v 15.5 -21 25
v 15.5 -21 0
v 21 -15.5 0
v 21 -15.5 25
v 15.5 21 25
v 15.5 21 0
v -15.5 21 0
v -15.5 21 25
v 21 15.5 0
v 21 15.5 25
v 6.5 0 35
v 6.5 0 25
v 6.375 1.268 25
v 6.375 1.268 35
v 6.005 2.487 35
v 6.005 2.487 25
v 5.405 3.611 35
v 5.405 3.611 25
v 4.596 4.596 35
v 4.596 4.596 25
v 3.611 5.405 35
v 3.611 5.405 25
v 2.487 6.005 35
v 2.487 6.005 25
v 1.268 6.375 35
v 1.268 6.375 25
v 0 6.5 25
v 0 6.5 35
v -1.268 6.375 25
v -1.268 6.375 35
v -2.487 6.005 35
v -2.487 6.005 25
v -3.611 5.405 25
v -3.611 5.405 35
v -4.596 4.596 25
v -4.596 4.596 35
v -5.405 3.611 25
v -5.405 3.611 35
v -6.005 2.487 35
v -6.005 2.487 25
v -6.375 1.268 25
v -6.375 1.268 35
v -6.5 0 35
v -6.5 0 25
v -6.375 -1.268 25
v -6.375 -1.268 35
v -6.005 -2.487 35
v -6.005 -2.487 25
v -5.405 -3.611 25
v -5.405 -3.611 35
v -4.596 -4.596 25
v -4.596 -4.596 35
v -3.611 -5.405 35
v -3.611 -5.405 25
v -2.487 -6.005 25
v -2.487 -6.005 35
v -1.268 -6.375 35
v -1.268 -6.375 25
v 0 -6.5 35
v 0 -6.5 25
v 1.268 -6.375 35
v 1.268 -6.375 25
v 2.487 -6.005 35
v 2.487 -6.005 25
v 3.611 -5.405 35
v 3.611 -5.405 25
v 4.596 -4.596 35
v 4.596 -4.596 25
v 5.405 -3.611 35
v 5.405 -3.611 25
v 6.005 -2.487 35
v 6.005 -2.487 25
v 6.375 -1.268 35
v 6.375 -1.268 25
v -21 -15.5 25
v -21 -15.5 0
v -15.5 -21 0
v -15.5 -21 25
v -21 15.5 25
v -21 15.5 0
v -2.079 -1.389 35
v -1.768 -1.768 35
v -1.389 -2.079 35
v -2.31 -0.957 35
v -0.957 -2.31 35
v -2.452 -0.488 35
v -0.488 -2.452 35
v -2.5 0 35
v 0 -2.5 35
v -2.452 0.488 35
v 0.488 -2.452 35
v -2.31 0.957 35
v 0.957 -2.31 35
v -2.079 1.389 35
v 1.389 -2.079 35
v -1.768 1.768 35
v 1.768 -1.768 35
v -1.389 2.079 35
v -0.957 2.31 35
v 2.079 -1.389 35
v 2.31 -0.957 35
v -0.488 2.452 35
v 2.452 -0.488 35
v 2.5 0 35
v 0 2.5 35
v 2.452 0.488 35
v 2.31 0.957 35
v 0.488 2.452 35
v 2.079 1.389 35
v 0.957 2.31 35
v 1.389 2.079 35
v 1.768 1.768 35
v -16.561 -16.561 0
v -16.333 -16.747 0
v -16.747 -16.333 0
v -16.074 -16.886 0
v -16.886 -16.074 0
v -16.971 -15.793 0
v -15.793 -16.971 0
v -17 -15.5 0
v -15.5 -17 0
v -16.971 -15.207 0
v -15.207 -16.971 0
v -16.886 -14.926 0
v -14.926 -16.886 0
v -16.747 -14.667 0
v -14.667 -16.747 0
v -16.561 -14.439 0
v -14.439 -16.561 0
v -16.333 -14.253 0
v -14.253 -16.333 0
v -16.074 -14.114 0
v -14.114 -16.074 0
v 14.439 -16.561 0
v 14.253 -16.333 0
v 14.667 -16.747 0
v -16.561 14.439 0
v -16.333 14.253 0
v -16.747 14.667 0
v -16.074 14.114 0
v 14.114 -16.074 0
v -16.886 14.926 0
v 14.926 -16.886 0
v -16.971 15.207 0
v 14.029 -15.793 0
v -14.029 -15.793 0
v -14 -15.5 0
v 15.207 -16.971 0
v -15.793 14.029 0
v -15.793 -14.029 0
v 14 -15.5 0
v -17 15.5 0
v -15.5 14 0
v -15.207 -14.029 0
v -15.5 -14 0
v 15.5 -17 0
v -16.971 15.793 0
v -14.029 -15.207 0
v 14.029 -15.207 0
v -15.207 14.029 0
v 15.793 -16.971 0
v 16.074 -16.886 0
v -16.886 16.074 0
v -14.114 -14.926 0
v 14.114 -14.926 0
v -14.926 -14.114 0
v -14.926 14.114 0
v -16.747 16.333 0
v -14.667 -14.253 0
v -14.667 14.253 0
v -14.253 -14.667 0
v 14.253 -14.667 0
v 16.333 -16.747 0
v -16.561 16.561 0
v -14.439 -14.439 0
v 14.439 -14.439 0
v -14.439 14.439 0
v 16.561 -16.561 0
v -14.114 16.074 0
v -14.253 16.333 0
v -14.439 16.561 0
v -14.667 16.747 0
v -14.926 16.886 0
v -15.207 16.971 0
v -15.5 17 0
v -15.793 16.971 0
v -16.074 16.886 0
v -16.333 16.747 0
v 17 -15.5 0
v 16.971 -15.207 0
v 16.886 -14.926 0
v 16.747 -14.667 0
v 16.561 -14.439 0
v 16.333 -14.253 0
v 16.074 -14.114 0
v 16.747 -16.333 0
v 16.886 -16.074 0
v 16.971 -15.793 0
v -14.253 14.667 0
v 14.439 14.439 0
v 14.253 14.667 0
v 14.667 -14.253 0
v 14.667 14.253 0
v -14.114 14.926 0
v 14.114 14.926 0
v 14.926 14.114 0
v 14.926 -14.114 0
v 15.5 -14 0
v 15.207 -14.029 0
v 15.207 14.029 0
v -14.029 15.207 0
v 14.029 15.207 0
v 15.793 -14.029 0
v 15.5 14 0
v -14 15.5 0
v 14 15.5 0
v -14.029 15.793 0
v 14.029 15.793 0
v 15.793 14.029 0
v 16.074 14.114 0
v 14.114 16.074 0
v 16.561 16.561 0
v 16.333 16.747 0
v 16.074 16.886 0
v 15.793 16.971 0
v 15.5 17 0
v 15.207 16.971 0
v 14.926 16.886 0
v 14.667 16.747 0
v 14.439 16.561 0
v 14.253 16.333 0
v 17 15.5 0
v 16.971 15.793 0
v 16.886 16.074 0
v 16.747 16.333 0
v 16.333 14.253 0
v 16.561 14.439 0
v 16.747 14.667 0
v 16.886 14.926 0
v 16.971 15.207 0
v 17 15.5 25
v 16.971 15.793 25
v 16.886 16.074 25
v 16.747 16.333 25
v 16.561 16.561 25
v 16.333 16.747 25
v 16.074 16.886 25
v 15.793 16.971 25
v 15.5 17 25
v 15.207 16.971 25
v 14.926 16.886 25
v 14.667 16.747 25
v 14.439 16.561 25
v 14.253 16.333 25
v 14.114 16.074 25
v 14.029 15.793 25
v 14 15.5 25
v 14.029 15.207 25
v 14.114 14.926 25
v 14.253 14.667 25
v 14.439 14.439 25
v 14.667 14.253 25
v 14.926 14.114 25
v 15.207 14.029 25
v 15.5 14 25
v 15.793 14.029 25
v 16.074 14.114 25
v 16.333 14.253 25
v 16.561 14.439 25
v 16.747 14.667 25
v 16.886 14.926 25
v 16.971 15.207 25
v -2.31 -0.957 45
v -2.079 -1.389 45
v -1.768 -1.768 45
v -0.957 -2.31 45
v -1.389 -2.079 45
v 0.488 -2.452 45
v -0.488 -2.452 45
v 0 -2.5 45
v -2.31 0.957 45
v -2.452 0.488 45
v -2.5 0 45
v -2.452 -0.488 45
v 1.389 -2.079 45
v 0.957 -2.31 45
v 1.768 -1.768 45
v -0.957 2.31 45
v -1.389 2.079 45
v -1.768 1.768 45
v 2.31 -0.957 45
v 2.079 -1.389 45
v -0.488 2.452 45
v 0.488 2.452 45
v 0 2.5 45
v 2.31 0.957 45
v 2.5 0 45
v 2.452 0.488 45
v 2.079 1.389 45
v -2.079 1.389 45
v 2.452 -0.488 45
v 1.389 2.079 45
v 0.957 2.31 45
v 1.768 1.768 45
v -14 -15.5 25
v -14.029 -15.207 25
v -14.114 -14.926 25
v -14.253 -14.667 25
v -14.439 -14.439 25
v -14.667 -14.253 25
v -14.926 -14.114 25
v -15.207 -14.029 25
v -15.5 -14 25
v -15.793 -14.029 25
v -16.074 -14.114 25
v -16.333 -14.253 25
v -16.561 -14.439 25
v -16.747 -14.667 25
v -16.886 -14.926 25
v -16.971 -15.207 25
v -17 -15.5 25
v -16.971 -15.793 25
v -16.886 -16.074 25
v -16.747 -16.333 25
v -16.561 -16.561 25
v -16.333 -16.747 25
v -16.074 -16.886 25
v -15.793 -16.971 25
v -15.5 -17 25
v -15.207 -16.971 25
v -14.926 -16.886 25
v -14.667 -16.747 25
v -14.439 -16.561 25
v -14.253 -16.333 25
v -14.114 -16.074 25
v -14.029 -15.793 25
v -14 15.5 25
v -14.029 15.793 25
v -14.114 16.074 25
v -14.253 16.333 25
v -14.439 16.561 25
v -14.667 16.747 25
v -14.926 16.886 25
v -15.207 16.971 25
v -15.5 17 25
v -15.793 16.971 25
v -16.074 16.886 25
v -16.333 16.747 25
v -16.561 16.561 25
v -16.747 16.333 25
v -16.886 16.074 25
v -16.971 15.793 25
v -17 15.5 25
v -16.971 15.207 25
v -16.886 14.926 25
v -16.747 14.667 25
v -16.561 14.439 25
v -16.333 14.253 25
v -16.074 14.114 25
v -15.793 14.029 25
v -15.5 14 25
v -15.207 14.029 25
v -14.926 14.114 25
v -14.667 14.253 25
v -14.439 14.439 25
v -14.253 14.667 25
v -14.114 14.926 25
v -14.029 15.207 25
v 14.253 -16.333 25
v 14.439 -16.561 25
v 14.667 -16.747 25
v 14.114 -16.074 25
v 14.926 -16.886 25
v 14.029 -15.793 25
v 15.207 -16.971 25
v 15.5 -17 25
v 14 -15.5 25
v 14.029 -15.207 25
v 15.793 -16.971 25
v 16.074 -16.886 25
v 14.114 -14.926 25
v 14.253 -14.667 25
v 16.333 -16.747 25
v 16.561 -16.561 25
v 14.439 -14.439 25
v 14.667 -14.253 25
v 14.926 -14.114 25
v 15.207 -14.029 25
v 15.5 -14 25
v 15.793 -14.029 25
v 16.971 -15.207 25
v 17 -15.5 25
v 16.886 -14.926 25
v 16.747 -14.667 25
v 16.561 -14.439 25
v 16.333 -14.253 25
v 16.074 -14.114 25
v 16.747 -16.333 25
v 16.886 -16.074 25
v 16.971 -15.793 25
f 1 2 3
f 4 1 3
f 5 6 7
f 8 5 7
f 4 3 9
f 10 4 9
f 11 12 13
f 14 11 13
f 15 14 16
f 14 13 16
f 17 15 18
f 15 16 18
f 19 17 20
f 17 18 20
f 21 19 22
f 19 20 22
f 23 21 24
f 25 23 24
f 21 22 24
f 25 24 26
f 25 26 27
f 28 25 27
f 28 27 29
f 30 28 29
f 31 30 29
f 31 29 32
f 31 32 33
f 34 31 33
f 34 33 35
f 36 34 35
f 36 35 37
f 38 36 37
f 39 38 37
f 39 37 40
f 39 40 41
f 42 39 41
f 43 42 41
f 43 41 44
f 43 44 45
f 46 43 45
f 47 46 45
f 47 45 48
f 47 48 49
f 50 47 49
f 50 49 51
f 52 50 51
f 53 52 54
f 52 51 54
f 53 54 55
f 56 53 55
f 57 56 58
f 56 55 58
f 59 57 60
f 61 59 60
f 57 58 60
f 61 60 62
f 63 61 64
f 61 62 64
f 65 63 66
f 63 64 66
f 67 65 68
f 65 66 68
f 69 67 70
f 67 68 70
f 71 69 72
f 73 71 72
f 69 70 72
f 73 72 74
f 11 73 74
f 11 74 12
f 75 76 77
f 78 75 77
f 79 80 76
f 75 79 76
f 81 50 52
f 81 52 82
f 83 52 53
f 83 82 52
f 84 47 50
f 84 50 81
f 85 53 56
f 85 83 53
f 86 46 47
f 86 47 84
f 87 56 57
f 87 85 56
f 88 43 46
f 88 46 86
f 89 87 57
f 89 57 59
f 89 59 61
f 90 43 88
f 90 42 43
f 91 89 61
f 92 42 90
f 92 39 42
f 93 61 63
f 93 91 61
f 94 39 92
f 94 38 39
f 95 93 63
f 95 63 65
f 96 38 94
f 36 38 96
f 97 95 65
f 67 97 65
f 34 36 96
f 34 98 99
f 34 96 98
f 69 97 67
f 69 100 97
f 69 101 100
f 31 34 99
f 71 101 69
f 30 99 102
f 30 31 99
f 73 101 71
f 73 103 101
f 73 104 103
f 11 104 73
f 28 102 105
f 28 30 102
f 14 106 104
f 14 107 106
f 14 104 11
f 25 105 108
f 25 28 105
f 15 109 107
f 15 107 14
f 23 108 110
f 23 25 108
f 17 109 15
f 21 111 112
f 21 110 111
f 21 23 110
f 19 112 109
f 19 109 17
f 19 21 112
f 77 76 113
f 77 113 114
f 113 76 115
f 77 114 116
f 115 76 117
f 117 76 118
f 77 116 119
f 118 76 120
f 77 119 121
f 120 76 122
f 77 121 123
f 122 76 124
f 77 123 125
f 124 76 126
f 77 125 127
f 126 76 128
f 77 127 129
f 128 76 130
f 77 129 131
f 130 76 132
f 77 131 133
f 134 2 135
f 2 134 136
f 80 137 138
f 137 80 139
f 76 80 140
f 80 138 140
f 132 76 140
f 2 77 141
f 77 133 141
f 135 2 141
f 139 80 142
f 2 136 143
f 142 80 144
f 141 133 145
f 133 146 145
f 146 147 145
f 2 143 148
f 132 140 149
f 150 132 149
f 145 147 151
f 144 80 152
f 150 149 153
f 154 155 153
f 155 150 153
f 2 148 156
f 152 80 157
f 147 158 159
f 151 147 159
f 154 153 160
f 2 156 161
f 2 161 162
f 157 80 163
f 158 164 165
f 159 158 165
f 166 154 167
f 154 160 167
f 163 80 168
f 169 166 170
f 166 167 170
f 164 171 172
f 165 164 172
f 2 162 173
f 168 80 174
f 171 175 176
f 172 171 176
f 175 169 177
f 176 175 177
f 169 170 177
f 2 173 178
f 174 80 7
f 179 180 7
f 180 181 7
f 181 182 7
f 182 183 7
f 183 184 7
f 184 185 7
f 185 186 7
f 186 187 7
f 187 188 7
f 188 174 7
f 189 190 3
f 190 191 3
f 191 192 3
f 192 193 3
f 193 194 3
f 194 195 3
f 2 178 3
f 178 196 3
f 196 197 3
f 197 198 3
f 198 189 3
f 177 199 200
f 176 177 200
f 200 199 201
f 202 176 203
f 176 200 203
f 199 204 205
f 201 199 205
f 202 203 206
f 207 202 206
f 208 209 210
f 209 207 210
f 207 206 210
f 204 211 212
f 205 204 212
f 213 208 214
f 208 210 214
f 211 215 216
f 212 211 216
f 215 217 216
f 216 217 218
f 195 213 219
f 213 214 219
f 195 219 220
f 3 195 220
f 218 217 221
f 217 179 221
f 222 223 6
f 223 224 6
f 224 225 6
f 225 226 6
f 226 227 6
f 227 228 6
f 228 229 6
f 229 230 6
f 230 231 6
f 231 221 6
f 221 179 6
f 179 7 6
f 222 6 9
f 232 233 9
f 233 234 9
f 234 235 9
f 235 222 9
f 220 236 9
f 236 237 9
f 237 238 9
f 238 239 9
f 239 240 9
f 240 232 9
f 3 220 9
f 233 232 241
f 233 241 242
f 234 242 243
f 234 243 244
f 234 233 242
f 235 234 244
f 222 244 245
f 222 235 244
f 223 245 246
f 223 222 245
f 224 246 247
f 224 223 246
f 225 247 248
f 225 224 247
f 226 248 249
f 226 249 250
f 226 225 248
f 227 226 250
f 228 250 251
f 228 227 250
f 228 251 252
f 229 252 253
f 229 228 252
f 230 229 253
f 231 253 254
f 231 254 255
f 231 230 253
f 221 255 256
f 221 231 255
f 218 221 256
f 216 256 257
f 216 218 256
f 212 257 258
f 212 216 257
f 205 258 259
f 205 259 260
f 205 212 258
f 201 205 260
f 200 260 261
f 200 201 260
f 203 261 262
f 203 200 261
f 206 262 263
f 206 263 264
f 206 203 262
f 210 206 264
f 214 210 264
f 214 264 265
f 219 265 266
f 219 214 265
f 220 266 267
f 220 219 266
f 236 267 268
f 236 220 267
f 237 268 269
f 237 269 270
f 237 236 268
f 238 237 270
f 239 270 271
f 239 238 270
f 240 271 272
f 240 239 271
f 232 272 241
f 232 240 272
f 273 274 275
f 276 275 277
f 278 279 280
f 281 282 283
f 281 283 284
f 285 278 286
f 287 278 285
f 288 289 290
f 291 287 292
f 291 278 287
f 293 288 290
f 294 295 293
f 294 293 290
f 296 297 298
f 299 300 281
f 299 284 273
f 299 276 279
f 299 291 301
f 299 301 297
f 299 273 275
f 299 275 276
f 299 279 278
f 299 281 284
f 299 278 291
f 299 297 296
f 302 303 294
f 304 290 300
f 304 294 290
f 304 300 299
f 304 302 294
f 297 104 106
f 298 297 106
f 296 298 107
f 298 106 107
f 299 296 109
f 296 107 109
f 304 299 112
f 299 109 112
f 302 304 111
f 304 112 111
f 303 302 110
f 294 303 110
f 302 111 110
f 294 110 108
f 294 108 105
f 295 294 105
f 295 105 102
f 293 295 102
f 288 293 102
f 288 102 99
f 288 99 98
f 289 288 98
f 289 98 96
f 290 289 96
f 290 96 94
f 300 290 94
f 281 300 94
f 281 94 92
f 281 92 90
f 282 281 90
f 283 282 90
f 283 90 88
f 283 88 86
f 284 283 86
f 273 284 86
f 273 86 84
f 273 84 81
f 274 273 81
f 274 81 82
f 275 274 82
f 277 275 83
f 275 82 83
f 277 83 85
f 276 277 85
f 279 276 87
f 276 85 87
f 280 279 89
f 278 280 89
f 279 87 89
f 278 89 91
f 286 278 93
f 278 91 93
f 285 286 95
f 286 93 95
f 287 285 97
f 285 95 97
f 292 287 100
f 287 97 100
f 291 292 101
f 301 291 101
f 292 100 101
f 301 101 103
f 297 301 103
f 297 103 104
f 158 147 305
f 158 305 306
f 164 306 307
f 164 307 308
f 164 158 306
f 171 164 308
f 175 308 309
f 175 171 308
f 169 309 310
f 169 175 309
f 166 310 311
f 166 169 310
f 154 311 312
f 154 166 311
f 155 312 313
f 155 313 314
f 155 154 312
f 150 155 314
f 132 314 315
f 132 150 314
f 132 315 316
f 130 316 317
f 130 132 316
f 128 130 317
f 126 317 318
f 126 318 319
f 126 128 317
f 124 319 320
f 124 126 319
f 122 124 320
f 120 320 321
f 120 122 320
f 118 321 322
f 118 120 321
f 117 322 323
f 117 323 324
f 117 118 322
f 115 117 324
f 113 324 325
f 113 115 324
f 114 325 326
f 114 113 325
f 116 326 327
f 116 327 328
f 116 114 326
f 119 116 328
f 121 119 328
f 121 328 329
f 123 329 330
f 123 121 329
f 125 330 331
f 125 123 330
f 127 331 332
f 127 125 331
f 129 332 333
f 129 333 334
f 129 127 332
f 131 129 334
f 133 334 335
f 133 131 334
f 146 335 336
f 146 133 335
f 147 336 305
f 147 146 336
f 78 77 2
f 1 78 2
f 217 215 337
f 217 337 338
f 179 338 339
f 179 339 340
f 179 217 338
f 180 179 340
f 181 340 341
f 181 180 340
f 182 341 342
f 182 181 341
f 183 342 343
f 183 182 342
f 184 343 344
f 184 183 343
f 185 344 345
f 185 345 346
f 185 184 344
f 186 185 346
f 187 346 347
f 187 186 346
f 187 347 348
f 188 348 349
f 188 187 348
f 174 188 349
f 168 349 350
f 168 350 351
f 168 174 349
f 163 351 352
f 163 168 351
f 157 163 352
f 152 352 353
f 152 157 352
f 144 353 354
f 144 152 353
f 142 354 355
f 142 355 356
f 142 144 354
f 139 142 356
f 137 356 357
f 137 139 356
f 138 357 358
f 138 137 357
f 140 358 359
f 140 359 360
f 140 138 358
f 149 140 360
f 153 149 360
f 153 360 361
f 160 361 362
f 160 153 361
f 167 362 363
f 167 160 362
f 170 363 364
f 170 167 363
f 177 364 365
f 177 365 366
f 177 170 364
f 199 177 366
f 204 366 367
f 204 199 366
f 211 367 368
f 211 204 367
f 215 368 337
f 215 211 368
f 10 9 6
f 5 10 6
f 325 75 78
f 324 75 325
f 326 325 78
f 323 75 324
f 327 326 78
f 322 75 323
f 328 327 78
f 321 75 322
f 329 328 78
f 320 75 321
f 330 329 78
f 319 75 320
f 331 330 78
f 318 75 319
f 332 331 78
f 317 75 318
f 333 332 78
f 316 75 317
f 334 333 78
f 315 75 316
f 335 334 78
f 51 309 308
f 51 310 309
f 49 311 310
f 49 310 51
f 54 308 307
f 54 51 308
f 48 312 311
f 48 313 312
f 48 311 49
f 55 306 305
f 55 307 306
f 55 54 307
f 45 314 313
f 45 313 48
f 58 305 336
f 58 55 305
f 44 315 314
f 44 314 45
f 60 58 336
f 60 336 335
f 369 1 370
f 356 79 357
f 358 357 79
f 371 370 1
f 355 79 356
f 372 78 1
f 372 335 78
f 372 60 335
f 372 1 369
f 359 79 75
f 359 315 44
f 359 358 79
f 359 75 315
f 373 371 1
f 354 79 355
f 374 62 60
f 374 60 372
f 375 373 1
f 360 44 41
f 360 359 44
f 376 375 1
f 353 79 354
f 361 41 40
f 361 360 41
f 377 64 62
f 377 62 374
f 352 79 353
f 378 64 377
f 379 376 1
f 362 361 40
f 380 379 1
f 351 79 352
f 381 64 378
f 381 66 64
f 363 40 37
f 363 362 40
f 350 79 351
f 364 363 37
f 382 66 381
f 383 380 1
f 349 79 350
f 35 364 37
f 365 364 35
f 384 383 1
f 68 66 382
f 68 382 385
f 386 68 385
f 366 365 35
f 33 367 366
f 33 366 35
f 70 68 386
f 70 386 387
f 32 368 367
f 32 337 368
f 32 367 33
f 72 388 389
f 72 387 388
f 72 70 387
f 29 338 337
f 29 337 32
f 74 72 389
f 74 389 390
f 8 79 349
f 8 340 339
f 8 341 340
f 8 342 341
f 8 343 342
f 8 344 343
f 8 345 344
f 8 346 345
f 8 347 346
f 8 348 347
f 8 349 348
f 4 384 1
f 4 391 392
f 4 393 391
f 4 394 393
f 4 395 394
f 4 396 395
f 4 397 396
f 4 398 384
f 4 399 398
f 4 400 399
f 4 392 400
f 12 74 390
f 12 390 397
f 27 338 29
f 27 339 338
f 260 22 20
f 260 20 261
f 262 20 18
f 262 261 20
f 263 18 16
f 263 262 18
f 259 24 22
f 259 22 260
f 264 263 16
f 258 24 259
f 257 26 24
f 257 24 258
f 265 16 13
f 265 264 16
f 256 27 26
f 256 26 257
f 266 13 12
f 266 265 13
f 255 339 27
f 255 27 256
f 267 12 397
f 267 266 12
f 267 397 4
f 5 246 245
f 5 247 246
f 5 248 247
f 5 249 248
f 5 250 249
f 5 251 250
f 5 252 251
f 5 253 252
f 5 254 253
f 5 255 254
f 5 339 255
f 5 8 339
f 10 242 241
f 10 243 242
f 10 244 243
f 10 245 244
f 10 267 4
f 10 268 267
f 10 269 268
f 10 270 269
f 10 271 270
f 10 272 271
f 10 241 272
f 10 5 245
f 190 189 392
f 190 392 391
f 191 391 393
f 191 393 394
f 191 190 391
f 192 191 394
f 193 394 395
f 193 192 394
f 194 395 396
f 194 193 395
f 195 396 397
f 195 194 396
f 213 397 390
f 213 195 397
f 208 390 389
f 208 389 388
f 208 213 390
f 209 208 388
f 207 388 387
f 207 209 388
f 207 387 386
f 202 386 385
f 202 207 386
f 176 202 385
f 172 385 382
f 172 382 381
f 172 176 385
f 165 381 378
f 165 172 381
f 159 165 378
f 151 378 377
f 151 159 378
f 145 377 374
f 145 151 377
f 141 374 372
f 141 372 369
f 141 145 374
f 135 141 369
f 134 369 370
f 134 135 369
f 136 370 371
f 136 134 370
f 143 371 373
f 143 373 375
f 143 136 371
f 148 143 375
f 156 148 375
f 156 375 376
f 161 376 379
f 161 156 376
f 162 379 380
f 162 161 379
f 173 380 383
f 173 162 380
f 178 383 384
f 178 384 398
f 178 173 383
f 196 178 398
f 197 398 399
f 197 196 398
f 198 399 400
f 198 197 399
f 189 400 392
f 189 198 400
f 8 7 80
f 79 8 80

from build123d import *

# Parameters (mm, degrees)
F0_R     = 1.5
F0_R_2   = 6.5
F1_DEPTH = 25
F0_R_3   = 2.5
F2_DEPTH = 35
F3_DEPTH = 45


# Not quite as in the source:
# - a feature names something its author has since deleted; it is built from what else it names


with BuildPart() as f1:
    # F0 (on Top) → F1 (new body)
    with BuildSketch(Plane.XY):
        Polygon((15.5, 21), (-15.5, 21), (-21, 15.5), (-21, -15.5), (-15.5, -21), (15.5, -21), (21, -15.5), (21, 15.5), align=None)
        with Locations((-15.5, -15.5)):
            Circle(F0_R, mode=Mode.SUBTRACT)
        with Locations((15.5, -15.5)):
            Circle(F0_R, mode=Mode.SUBTRACT)
        with Locations((-15.5, 15.5)):
            Circle(F0_R, mode=Mode.SUBTRACT)
        Circle(F0_R_2, mode=Mode.SUBTRACT)
        with Locations((15.5, 15.5)):
            Circle(F0_R, mode=Mode.SUBTRACT)
    extrude(amount=F1_DEPTH)

    # F0 (on Top) → F2 (join)
    with BuildSketch(Plane.XY):
        Circle(F0_R_2)
        Circle(F0_R_3, mode=Mode.SUBTRACT)
    extrude(amount=F2_DEPTH)

    # F0 (on Top) → F3 (join)
    with BuildSketch(Plane.XY):
        Circle(F0_R_3)
    extrude(amount=F3_DEPTH)


solid = f1.part
